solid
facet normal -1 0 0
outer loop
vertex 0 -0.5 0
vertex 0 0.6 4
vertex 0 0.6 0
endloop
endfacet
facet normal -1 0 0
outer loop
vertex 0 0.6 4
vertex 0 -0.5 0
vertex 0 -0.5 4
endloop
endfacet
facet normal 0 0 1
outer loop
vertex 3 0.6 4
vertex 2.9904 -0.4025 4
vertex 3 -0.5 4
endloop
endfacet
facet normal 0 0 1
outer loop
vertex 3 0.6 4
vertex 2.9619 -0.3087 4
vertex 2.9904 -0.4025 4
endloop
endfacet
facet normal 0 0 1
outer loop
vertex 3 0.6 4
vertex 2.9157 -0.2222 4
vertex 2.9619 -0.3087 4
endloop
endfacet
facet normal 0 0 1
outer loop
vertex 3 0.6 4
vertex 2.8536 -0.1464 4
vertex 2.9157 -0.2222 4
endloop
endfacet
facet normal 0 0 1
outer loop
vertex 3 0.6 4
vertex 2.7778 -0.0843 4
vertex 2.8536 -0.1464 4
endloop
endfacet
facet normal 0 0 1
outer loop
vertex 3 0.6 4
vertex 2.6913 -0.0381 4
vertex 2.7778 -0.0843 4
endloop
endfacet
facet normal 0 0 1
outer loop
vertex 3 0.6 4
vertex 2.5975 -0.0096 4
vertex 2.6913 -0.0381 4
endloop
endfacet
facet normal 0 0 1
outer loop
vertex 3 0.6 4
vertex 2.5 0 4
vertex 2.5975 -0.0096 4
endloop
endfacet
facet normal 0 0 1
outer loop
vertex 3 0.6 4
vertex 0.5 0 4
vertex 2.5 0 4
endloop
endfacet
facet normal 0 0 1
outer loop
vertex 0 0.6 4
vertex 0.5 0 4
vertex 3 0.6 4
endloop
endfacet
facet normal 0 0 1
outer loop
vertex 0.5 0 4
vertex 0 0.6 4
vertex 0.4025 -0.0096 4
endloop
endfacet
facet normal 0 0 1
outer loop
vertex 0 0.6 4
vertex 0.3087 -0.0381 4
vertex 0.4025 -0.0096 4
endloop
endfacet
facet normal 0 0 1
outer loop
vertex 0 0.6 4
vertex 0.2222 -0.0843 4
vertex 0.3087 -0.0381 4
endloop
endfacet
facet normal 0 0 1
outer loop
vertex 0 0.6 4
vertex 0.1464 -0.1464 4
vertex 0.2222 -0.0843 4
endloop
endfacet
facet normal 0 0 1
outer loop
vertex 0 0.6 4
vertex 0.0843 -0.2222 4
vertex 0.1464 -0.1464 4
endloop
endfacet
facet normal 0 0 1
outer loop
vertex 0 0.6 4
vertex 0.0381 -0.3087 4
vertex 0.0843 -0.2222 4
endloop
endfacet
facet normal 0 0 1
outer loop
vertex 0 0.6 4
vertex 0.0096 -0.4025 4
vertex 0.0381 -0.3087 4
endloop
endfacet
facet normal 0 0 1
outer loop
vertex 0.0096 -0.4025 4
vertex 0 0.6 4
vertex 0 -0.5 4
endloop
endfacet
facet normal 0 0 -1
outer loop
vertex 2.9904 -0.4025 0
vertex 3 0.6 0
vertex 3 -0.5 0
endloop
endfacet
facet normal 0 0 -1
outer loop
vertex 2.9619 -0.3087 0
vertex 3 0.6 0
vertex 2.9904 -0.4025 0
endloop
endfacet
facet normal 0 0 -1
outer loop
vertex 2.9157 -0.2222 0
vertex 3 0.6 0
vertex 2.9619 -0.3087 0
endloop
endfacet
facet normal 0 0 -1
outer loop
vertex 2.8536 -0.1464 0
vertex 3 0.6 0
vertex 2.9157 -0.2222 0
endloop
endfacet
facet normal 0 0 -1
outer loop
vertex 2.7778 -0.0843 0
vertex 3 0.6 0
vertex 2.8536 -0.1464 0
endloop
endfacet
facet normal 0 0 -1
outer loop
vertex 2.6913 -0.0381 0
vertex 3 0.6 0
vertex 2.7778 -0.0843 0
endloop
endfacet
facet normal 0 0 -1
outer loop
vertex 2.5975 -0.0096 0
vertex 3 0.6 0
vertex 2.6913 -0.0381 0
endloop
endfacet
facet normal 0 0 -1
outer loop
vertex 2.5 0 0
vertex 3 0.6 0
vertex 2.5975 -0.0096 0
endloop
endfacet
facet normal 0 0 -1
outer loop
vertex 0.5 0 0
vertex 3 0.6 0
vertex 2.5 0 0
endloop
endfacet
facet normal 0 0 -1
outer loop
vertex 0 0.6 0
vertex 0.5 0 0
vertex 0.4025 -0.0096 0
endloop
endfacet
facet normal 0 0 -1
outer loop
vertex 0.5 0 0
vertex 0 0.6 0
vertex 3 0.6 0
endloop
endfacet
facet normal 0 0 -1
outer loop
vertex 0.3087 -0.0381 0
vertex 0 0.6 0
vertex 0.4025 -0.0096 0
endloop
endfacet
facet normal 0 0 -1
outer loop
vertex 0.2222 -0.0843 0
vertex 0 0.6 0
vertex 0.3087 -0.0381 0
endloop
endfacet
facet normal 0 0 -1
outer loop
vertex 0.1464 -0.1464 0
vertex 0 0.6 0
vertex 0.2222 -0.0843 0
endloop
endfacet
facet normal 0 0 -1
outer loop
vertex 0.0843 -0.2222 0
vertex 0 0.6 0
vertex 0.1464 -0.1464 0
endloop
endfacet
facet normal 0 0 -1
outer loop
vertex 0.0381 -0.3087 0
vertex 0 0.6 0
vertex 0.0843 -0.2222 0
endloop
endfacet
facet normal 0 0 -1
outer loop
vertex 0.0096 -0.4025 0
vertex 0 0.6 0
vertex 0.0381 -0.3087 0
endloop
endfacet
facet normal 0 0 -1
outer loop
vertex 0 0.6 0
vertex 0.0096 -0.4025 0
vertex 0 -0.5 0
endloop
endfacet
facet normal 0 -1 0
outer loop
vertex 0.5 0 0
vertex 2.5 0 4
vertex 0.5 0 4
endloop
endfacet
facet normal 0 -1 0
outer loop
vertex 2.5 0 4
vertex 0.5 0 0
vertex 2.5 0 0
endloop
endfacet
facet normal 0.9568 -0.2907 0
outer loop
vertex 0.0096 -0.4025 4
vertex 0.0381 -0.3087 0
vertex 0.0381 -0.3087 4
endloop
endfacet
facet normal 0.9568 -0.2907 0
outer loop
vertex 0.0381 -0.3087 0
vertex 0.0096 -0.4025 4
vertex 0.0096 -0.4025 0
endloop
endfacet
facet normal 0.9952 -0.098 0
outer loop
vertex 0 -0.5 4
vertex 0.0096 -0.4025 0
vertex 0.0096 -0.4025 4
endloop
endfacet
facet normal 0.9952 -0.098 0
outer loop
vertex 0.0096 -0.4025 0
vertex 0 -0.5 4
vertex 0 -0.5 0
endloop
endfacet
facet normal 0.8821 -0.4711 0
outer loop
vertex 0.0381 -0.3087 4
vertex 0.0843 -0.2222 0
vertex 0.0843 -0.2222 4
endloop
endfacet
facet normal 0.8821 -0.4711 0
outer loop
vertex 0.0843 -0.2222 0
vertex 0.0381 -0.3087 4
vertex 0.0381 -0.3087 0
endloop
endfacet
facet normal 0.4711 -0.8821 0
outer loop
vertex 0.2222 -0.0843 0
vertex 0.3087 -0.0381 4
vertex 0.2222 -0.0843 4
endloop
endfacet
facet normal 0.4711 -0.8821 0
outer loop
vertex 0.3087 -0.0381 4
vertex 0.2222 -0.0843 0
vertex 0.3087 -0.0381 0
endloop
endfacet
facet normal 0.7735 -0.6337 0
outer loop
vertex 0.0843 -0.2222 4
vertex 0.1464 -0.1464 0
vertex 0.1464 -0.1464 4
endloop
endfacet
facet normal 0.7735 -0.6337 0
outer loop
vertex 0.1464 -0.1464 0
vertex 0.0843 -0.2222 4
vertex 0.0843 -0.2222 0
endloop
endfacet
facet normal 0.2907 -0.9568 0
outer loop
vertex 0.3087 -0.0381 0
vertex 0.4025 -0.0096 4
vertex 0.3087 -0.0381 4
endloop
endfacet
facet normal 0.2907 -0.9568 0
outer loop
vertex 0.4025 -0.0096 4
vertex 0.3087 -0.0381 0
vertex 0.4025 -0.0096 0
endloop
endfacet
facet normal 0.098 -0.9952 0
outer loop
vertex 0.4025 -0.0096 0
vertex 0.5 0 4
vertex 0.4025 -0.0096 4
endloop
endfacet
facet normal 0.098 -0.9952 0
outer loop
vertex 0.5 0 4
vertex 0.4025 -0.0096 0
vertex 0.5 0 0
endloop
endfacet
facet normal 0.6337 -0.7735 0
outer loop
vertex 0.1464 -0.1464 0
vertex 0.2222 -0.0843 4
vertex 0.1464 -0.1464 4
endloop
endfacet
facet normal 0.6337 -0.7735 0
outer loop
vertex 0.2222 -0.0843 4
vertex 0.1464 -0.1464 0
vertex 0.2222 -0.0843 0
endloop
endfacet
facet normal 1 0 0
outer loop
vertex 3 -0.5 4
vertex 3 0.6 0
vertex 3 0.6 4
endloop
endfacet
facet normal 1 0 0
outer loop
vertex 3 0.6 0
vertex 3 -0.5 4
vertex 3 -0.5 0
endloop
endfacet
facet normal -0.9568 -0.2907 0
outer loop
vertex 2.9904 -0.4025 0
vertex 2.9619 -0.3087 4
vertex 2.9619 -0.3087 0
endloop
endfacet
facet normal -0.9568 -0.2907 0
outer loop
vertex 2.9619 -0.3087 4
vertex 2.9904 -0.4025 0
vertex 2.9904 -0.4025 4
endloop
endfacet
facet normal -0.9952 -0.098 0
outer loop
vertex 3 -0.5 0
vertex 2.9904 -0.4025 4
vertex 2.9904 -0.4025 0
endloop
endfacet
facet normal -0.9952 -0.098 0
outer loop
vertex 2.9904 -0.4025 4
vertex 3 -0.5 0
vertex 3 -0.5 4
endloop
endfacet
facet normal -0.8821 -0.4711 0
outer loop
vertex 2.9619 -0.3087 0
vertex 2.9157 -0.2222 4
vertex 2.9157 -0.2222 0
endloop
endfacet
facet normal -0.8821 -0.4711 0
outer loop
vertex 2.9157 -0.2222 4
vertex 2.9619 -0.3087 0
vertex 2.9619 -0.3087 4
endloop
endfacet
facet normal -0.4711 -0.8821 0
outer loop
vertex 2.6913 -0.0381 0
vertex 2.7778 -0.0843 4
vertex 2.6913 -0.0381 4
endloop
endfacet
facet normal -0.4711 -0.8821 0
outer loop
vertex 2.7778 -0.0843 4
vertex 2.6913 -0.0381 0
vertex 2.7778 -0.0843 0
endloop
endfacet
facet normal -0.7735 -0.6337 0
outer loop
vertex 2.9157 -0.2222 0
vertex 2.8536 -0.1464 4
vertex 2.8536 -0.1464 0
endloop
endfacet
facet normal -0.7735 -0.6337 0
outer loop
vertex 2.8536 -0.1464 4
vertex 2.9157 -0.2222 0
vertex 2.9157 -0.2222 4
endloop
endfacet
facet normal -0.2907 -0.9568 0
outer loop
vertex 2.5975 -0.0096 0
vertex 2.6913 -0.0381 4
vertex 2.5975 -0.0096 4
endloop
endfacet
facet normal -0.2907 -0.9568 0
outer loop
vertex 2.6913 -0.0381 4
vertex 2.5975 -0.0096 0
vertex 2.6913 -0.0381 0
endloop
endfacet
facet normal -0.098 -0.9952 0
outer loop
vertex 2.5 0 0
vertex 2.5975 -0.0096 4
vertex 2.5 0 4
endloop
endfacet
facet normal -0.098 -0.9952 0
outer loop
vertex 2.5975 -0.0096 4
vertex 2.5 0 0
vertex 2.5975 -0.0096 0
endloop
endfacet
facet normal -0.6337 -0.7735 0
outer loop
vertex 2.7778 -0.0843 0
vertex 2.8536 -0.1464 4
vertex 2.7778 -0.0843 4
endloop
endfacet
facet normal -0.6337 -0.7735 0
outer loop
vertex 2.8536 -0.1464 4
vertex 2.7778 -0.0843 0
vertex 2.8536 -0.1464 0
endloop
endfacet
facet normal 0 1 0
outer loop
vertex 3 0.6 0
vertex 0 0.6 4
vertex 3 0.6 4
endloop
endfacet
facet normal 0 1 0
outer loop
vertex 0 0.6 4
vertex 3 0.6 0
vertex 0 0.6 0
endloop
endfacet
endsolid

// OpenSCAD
// Generated by SolidPython 1.1.3 on 2024-06-27 11:59:32
$fn=32;


rotate(a = [0, 0, 0]) {
	union() {
		cube(size = [3, 0.6000000000, 4]);
		translate(v = [0.5000000000, -0.5000000000, 0]) {
			mirror(v = [1, 0, 0]) {
				difference() {
					cube(size = [0.5000000000, 0.5000000000, 4]);
					cylinder(h = 4, r = 0.5000000000);
				}
			}
		}
		translate(v = [2.5000000000, -0.5000000000, 0]) {
			difference() {
				cube(size = [0.5000000000, 0.5000000000, 4]);
				cylinder(h = 4, r = 0.5000000000);
			}
		}
	}
}
/***********************************************
*********      SolidPython code:      **********
************************************************
 
from solid import *
from solid.utils import *

COMPLIANCE_LENGTH = 3
COMPLIANCE_THICKNESS = 0.6
COMPLIANCE_FILLET_RADIUS = 0.5

THICKNESS = 4


def fillet(r, h):
    return cube([r, r, h]) - cylinder(r, h)


linkage = cube([COMPLIANCE_LENGTH, COMPLIANCE_THICKNESS, THICKNESS])
linkage += translate([COMPLIANCE_FILLET_RADIUS, -COMPLIANCE_FILLET_RADIUS, 0])(
    mirror([1, 0, 0])(fillet(COMPLIANCE_FILLET_RADIUS, THICKNESS))
)
linkage += translate(
    [COMPLIANCE_LENGTH - COMPLIANCE_FILLET_RADIUS, -COMPLIANCE_FILLET_RADIUS, 0]
)(fillet(COMPLIANCE_FILLET_RADIUS, THICKNESS))

linkage = rotate([0, 0, 0])(linkage)

scad_render_to_file(linkage, "./shearing_auxetics/linkage.scad", file_header="$fn=32;")
 
 
************************************************/
